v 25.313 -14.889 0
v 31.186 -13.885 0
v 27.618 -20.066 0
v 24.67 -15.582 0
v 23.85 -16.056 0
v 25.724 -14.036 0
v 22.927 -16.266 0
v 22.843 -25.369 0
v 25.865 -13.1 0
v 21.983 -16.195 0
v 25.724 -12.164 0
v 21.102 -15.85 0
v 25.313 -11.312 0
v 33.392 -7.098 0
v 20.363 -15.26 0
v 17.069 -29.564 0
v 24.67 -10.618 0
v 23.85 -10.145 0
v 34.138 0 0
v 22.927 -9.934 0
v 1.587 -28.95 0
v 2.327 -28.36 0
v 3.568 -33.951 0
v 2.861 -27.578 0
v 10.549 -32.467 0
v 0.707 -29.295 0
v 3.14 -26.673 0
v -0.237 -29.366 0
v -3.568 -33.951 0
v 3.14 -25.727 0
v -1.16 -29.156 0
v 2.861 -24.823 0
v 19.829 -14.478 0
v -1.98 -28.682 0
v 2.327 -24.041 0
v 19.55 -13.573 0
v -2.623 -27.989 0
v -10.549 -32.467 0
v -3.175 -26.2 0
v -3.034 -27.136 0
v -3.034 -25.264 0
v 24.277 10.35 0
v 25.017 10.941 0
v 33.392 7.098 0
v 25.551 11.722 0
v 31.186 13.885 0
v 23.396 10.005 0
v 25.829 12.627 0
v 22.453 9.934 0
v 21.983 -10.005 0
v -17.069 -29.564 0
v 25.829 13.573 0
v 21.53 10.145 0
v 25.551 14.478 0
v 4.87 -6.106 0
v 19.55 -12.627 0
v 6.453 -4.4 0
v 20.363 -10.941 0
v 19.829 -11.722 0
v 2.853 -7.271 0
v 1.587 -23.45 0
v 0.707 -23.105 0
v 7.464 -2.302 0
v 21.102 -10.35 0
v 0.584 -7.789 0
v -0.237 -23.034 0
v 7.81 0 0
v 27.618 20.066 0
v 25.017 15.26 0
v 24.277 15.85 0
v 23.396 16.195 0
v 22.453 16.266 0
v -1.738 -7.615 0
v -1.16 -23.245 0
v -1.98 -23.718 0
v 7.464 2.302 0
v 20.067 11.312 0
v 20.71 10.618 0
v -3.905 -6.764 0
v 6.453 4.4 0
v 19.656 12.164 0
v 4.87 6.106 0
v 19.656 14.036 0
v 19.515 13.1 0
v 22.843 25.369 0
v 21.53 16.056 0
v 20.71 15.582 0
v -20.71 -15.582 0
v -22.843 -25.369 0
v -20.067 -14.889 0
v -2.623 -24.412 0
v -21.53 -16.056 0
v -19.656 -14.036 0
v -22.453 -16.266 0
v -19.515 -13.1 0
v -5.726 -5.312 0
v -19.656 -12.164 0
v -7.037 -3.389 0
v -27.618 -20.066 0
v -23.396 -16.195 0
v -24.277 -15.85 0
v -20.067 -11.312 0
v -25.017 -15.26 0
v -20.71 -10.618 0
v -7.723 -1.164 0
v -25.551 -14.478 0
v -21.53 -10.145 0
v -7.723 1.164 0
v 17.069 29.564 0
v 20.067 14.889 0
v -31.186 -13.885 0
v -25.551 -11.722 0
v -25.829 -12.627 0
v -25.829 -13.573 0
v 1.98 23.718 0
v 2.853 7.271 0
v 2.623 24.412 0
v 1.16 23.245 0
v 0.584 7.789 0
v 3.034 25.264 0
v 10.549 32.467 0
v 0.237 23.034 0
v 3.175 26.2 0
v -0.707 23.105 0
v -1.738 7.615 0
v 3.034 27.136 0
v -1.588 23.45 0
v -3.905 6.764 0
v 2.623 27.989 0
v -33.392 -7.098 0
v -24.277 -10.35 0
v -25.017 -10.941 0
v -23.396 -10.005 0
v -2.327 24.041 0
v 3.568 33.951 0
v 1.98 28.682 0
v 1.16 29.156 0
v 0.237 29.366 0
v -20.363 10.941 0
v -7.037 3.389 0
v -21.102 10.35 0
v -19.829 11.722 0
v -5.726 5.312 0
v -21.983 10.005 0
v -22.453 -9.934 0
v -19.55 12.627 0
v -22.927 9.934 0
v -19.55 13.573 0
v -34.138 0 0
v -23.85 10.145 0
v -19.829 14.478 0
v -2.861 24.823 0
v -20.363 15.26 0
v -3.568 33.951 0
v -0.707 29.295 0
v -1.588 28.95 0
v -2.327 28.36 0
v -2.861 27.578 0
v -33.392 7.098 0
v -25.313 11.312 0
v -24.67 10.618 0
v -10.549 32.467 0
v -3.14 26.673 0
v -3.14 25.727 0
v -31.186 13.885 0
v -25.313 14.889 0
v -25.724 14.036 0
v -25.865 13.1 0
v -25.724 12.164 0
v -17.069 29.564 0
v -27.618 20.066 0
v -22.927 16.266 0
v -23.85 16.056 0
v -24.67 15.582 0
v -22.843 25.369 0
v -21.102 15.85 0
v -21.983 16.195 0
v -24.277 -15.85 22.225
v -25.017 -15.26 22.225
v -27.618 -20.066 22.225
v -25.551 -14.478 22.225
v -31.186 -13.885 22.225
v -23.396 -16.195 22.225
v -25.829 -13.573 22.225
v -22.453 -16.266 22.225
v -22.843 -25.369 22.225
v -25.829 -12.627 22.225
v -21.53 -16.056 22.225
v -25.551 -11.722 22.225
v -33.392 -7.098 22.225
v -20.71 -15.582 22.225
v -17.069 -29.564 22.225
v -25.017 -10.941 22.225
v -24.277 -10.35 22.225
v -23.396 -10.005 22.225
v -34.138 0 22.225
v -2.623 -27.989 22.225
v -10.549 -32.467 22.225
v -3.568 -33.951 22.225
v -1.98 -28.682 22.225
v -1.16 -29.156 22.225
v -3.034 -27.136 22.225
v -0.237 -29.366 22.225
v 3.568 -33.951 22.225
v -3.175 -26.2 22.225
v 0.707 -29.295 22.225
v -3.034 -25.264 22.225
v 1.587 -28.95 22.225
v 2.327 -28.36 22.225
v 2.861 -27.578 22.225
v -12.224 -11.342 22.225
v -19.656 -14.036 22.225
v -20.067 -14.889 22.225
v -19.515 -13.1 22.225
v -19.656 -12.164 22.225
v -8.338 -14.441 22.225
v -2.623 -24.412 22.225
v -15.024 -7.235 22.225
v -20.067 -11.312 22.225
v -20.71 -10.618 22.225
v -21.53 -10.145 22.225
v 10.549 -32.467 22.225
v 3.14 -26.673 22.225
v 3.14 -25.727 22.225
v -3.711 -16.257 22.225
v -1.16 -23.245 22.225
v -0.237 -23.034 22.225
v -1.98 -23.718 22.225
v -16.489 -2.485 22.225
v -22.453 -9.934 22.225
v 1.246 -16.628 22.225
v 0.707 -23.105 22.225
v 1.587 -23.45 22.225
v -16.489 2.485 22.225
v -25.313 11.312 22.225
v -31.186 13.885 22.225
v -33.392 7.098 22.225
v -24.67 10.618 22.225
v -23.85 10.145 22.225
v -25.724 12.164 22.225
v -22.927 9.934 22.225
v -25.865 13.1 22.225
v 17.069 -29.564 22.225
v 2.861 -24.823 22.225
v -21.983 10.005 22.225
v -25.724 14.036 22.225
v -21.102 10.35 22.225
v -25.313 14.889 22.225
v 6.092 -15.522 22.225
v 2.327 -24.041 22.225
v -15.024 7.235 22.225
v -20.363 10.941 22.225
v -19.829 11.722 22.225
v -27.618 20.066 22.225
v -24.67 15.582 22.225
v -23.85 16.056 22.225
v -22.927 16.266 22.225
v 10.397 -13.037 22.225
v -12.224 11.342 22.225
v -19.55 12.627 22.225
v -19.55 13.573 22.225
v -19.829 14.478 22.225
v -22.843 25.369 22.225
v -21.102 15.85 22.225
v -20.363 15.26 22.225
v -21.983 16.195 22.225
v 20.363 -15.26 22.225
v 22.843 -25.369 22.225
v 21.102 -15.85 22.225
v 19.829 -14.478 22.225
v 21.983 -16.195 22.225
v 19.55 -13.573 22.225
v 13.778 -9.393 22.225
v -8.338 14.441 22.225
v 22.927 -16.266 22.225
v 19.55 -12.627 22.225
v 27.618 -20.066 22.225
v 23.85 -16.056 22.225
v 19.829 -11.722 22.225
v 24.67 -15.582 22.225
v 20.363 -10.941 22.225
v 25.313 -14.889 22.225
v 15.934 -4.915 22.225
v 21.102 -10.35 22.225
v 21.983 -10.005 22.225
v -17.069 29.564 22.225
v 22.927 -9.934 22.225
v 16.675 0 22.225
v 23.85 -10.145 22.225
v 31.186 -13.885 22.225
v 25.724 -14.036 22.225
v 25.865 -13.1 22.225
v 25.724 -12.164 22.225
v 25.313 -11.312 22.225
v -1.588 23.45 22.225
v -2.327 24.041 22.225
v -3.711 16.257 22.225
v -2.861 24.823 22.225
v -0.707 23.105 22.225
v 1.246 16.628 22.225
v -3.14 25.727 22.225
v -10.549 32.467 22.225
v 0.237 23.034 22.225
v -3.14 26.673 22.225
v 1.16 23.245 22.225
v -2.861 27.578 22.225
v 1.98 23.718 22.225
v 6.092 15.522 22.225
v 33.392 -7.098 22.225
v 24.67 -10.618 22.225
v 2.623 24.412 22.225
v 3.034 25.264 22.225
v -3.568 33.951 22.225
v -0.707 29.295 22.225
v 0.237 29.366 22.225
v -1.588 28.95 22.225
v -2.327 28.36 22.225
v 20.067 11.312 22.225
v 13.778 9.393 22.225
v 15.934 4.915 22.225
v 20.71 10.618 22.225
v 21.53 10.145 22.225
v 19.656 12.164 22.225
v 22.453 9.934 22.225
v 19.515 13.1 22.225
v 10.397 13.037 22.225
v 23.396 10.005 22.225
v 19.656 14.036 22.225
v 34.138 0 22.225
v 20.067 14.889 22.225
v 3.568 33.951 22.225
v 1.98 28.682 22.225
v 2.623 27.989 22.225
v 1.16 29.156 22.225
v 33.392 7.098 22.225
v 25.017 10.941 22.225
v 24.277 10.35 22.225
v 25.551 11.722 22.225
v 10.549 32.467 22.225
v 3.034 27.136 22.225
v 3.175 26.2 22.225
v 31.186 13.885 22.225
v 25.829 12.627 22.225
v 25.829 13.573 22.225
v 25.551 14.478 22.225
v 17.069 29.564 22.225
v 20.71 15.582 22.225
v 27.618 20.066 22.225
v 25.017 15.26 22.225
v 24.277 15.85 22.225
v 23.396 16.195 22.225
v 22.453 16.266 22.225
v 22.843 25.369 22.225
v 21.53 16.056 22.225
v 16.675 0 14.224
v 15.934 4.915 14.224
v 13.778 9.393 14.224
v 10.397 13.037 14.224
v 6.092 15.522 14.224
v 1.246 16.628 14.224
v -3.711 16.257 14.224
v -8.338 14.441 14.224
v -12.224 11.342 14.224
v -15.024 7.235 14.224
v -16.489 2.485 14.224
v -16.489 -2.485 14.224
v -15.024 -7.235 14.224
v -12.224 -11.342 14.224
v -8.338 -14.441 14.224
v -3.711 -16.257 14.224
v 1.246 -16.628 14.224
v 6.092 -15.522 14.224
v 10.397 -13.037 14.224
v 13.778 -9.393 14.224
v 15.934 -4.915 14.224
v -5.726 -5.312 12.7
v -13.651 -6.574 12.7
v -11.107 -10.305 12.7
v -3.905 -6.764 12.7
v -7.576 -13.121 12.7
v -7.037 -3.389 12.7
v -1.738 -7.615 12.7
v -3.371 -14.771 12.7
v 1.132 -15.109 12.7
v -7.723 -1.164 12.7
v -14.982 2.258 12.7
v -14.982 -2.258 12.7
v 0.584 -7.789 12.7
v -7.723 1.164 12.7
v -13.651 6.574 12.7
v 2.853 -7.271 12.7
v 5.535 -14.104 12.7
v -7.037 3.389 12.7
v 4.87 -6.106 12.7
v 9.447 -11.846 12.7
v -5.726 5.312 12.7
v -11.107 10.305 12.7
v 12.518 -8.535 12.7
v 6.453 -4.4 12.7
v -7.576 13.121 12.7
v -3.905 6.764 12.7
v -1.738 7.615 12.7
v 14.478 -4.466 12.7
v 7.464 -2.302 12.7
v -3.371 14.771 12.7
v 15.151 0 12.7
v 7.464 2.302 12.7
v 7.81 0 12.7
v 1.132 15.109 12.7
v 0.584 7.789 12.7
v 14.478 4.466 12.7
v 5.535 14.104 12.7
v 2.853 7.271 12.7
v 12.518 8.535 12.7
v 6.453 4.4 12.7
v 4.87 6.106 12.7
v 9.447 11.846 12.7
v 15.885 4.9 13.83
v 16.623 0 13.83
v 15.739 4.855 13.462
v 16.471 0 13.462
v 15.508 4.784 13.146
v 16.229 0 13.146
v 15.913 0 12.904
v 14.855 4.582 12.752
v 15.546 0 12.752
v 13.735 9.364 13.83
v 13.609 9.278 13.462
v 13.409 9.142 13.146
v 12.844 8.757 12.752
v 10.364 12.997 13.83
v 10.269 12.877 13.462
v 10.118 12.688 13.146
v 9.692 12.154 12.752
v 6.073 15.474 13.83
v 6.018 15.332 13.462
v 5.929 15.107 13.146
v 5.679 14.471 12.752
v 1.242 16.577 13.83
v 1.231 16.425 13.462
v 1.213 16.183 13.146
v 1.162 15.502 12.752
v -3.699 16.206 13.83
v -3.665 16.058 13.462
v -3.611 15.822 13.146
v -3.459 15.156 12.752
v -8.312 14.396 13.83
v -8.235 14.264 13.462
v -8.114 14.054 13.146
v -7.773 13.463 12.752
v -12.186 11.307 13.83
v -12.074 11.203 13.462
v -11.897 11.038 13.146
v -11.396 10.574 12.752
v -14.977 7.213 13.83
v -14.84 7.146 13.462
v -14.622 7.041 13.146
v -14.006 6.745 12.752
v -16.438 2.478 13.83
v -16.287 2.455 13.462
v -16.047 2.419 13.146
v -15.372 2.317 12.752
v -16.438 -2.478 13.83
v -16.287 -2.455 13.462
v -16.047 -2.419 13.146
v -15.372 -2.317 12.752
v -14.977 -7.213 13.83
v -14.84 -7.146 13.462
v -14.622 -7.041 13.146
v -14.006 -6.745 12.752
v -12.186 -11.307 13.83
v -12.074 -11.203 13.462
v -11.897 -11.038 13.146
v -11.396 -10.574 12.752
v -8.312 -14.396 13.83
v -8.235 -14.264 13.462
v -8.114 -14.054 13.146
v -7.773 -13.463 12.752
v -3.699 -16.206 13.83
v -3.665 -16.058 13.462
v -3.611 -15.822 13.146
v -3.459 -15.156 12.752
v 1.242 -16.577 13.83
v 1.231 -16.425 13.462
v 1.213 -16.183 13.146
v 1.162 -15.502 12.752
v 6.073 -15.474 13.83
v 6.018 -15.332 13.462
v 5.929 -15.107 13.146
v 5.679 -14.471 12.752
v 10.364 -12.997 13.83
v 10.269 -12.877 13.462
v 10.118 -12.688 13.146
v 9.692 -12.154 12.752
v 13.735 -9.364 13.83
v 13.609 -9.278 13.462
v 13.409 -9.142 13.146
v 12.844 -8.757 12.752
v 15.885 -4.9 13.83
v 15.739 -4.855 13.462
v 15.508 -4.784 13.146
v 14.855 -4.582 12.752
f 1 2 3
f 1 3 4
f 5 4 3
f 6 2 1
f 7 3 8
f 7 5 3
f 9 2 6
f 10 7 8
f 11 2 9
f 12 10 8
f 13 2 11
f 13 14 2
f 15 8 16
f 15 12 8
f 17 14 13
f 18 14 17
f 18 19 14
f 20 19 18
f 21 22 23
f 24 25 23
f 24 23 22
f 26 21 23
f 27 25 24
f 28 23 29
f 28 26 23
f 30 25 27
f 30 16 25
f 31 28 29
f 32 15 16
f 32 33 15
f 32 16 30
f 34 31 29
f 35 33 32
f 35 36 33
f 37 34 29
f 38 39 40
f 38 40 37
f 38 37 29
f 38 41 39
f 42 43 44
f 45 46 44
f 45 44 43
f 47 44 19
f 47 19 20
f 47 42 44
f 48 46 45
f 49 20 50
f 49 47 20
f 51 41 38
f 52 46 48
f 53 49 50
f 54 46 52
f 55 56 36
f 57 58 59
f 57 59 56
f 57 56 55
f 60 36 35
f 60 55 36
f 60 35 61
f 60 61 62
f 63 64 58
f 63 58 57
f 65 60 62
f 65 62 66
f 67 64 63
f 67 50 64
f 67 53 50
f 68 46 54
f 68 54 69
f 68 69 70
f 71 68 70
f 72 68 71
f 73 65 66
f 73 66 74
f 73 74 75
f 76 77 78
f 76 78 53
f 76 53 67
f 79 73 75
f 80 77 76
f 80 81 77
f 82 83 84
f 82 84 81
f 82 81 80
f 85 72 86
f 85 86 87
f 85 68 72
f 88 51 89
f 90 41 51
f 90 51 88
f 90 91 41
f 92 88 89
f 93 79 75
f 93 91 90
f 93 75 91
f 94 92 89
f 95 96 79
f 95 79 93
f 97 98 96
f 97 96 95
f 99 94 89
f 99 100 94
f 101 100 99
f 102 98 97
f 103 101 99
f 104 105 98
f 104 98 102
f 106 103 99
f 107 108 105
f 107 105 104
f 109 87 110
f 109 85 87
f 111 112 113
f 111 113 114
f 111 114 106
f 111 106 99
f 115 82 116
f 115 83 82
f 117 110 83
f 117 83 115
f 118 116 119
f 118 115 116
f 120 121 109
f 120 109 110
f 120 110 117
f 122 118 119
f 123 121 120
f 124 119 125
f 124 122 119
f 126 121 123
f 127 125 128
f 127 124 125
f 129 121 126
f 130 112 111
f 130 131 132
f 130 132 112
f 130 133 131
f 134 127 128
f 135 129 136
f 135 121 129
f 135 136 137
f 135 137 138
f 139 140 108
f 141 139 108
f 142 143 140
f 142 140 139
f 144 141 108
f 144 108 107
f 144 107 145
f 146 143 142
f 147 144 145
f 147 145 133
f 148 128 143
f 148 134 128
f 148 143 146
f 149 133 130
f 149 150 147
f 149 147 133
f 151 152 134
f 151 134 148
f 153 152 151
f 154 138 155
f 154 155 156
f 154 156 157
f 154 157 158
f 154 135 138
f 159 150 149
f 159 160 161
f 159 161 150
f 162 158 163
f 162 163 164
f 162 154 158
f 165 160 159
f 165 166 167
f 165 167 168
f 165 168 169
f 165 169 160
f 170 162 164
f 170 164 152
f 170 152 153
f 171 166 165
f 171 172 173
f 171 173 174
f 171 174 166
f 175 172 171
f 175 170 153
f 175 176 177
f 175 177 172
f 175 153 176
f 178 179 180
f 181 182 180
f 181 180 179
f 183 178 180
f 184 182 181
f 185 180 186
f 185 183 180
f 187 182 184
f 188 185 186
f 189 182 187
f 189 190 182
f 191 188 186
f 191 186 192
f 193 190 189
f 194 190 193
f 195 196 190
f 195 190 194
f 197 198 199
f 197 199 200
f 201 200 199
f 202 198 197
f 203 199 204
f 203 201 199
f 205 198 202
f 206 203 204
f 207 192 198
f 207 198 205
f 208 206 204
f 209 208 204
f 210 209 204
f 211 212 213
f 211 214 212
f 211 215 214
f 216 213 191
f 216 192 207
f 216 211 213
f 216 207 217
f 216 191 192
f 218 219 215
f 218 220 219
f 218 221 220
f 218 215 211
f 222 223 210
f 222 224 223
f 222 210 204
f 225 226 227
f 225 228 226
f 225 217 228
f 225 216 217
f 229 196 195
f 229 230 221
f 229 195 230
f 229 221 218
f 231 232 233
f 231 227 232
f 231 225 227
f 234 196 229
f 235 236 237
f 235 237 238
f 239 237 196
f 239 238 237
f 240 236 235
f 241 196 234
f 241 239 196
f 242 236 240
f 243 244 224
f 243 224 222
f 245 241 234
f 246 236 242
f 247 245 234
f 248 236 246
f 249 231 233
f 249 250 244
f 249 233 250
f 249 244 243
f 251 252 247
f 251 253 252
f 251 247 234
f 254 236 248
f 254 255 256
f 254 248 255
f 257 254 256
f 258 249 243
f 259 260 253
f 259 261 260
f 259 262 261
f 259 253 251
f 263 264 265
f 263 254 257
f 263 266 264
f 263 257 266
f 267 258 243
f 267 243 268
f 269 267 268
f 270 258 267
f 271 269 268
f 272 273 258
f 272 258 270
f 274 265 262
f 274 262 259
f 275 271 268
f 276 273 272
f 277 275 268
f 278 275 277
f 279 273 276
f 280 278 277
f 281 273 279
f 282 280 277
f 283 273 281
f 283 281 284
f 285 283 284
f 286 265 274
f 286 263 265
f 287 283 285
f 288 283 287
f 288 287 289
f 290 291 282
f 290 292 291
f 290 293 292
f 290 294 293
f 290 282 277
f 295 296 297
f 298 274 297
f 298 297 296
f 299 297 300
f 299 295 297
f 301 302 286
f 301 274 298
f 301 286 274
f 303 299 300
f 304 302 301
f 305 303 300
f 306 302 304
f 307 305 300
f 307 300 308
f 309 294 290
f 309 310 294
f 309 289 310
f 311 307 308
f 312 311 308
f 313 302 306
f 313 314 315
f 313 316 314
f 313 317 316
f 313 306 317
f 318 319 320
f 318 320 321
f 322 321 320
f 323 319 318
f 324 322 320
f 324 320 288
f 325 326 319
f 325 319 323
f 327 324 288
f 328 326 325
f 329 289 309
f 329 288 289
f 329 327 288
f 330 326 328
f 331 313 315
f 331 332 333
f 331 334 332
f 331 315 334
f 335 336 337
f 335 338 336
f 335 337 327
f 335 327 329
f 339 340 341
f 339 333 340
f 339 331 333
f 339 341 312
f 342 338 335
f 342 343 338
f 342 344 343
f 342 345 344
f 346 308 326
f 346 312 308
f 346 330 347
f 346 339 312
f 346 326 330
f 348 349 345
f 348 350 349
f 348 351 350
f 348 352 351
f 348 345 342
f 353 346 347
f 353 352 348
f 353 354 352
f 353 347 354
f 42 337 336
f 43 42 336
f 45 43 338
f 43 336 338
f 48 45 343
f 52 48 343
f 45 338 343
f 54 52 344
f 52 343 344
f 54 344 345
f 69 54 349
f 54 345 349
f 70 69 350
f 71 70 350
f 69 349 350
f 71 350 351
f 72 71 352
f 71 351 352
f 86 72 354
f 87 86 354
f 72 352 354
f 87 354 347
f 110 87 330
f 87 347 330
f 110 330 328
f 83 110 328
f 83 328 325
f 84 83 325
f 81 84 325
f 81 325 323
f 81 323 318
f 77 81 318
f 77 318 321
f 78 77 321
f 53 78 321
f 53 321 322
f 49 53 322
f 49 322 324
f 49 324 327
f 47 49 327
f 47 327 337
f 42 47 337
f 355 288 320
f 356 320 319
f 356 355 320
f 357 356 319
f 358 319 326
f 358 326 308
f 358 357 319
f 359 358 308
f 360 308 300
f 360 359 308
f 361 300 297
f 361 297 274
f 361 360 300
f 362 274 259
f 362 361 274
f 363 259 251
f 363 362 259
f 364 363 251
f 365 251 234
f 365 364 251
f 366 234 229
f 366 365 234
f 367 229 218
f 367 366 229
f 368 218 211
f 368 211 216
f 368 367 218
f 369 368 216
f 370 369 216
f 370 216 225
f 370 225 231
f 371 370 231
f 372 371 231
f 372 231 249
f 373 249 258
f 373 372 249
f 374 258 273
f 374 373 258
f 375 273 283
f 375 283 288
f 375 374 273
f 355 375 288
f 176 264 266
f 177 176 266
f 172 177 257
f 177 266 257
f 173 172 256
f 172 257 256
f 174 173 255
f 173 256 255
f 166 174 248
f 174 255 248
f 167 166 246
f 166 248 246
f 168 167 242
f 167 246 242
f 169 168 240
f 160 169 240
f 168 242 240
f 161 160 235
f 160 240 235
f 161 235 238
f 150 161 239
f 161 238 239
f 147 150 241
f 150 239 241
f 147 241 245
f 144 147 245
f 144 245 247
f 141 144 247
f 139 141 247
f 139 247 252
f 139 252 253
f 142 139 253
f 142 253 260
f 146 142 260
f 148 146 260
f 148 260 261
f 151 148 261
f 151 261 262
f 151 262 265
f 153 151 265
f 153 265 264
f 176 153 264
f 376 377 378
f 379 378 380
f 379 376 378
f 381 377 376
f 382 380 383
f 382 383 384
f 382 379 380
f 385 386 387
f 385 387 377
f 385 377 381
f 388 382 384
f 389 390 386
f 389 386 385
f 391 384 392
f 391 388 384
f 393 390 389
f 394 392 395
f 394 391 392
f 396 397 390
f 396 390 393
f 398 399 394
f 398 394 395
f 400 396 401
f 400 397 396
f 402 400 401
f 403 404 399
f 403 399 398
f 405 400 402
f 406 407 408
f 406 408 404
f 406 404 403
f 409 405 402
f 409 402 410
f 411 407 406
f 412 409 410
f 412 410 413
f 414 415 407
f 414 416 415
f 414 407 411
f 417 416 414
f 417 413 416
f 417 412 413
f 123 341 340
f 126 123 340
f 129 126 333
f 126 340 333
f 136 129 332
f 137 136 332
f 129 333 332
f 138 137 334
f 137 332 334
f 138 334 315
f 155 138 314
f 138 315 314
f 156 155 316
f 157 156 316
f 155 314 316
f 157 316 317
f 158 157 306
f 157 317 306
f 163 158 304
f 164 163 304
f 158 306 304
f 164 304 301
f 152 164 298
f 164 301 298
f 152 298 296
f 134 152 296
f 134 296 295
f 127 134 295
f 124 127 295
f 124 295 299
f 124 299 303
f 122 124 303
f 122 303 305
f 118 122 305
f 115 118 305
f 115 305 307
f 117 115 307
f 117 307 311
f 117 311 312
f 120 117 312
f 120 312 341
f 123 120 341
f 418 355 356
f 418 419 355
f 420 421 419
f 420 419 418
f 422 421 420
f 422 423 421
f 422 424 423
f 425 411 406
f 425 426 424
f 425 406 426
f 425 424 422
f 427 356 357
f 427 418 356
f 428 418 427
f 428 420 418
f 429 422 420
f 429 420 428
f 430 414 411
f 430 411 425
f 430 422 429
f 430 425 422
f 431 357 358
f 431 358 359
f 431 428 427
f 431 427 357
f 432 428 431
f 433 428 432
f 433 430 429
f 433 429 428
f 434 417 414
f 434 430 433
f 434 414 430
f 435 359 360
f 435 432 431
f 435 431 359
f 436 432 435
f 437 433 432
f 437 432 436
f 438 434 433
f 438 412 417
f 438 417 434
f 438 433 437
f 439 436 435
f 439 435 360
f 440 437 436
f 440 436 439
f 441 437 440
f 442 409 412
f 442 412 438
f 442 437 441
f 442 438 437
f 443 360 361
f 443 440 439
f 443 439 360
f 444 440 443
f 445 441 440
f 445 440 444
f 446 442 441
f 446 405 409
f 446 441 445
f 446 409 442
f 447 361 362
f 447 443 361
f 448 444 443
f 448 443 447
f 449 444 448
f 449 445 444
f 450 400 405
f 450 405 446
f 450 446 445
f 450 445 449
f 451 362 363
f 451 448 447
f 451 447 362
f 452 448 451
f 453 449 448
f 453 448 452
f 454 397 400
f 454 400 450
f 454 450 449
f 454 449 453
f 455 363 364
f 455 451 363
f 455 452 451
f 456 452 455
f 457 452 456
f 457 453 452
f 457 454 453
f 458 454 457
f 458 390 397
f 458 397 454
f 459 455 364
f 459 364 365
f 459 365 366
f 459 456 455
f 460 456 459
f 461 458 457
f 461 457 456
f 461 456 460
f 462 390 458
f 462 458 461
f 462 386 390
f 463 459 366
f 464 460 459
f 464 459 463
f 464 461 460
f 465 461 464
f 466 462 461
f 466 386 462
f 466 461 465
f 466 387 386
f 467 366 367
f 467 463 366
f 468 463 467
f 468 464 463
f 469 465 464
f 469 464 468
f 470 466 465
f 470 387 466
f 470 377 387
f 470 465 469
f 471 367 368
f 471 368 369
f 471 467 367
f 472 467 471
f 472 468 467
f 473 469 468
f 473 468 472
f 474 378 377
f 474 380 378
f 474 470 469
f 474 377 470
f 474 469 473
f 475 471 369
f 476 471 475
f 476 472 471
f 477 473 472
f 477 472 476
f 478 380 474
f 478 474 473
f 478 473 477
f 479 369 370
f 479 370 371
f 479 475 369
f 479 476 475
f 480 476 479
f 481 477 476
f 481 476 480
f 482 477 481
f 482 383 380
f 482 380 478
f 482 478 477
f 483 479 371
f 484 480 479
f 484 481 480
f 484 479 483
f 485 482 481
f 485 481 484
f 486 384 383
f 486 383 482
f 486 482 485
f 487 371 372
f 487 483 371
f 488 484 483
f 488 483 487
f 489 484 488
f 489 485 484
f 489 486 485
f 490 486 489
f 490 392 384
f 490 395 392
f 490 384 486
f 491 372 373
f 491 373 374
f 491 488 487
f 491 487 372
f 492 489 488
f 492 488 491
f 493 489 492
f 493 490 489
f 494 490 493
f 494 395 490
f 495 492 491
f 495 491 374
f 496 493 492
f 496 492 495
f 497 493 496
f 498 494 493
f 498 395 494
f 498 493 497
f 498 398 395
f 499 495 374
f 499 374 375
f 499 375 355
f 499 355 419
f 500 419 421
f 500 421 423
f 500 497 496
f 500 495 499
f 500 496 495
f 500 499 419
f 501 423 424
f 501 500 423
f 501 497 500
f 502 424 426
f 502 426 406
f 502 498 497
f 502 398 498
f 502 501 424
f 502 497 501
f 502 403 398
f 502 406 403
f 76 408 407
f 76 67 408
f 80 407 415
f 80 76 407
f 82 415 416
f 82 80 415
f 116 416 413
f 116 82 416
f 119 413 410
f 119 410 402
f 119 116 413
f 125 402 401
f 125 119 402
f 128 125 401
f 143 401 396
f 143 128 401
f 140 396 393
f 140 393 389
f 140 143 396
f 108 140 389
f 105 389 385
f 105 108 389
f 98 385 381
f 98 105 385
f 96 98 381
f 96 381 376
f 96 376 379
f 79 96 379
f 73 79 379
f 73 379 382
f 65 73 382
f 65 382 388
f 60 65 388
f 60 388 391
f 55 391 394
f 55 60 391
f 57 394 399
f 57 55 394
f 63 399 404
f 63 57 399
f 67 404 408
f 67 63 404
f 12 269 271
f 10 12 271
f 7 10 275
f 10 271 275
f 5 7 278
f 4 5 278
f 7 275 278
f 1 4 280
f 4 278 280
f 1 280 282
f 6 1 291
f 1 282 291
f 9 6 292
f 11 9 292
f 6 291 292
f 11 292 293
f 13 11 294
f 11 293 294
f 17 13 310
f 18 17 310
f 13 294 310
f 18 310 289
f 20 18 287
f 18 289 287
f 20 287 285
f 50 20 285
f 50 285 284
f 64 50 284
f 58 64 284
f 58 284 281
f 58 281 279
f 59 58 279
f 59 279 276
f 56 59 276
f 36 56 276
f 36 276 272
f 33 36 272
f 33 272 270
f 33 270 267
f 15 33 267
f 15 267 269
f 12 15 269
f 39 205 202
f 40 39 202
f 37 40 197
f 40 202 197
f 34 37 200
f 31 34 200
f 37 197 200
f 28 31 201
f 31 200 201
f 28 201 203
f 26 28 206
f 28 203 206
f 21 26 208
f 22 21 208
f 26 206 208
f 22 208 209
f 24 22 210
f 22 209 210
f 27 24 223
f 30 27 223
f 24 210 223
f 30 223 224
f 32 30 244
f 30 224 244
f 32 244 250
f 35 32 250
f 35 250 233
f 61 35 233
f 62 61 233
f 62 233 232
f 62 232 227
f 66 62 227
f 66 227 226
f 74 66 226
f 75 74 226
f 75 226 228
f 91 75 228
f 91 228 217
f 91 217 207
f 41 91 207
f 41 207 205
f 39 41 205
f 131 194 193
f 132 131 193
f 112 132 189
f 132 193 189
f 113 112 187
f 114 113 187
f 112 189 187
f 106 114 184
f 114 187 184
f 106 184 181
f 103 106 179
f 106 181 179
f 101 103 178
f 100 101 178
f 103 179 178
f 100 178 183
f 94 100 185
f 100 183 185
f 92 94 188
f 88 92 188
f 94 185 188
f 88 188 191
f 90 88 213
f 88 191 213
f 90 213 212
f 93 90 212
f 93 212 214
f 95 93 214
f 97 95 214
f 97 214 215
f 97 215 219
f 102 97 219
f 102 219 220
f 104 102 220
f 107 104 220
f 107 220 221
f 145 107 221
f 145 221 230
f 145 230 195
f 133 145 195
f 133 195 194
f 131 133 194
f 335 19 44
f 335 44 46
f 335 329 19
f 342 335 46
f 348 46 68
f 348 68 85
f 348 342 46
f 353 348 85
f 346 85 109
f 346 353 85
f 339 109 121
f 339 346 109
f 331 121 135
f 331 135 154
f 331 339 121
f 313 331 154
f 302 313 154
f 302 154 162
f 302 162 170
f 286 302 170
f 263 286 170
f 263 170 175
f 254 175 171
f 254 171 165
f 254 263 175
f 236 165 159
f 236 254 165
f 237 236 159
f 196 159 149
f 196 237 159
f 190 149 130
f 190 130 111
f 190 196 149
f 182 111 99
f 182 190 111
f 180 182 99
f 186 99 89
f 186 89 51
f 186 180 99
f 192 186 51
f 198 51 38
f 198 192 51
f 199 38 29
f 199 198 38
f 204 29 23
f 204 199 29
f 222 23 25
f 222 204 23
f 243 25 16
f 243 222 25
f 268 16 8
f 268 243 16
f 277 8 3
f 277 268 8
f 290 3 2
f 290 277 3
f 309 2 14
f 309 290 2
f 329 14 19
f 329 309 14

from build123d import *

# Parameters (mm, degrees)
F2_R            = 3.175
F3_DEPTH        = 22.226
F3_COPIES_COUNT = 6


# Not quite as in the source:
# - a pattern or mirror of a feature is missing from the dataset's text; its kind, count and spacing are read off the source's solid


with BuildPart() as f1:
    # F0 (on Front) → F1 (revolve)
    with BuildSketch(Plane.XZ):
        with BuildLine():
            Line((7.8105, 0), (34.1376, 0))
            Line((34.1376, 0), (34.1376, 22.225))
            Line((34.1376, 22.225), (16.6751, 22.225))
            Line((16.6751, 22.225), (16.6751, 14.224))
            ThreePointArc((16.6751, 14.224), (16.2287307345, 13.1463692655), (15.1511, 12.7))
            Line((15.1511, 12.7), (7.8105, 12.7))
            Line((7.8105, 12.7), (7.8105, 0))
        make_face()
    revolve(axis=Axis((0, 0, 6.35), (0, 0, 1)))

    # F2 (on face) → F3 (cut, through all)
    with BuildSketch(Plane.XY.offset(22.225)):
        with Locations((0, 26.2001)):
            Circle(F2_R)
    f3 = extrude(amount=-F3_DEPTH, mode=Mode.SUBTRACT)

    # F3_copies: F3 ×6 about axis
    f3_copies_axis = Axis((0, 0, 0), (0, 0, 1))
    for i in range(1, F3_COPIES_COUNT):
        add(f3.rotate(f3_copies_axis, i * 360 / F3_COPIES_COUNT), mode=Mode.SUBTRACT)


solid = f1.part
